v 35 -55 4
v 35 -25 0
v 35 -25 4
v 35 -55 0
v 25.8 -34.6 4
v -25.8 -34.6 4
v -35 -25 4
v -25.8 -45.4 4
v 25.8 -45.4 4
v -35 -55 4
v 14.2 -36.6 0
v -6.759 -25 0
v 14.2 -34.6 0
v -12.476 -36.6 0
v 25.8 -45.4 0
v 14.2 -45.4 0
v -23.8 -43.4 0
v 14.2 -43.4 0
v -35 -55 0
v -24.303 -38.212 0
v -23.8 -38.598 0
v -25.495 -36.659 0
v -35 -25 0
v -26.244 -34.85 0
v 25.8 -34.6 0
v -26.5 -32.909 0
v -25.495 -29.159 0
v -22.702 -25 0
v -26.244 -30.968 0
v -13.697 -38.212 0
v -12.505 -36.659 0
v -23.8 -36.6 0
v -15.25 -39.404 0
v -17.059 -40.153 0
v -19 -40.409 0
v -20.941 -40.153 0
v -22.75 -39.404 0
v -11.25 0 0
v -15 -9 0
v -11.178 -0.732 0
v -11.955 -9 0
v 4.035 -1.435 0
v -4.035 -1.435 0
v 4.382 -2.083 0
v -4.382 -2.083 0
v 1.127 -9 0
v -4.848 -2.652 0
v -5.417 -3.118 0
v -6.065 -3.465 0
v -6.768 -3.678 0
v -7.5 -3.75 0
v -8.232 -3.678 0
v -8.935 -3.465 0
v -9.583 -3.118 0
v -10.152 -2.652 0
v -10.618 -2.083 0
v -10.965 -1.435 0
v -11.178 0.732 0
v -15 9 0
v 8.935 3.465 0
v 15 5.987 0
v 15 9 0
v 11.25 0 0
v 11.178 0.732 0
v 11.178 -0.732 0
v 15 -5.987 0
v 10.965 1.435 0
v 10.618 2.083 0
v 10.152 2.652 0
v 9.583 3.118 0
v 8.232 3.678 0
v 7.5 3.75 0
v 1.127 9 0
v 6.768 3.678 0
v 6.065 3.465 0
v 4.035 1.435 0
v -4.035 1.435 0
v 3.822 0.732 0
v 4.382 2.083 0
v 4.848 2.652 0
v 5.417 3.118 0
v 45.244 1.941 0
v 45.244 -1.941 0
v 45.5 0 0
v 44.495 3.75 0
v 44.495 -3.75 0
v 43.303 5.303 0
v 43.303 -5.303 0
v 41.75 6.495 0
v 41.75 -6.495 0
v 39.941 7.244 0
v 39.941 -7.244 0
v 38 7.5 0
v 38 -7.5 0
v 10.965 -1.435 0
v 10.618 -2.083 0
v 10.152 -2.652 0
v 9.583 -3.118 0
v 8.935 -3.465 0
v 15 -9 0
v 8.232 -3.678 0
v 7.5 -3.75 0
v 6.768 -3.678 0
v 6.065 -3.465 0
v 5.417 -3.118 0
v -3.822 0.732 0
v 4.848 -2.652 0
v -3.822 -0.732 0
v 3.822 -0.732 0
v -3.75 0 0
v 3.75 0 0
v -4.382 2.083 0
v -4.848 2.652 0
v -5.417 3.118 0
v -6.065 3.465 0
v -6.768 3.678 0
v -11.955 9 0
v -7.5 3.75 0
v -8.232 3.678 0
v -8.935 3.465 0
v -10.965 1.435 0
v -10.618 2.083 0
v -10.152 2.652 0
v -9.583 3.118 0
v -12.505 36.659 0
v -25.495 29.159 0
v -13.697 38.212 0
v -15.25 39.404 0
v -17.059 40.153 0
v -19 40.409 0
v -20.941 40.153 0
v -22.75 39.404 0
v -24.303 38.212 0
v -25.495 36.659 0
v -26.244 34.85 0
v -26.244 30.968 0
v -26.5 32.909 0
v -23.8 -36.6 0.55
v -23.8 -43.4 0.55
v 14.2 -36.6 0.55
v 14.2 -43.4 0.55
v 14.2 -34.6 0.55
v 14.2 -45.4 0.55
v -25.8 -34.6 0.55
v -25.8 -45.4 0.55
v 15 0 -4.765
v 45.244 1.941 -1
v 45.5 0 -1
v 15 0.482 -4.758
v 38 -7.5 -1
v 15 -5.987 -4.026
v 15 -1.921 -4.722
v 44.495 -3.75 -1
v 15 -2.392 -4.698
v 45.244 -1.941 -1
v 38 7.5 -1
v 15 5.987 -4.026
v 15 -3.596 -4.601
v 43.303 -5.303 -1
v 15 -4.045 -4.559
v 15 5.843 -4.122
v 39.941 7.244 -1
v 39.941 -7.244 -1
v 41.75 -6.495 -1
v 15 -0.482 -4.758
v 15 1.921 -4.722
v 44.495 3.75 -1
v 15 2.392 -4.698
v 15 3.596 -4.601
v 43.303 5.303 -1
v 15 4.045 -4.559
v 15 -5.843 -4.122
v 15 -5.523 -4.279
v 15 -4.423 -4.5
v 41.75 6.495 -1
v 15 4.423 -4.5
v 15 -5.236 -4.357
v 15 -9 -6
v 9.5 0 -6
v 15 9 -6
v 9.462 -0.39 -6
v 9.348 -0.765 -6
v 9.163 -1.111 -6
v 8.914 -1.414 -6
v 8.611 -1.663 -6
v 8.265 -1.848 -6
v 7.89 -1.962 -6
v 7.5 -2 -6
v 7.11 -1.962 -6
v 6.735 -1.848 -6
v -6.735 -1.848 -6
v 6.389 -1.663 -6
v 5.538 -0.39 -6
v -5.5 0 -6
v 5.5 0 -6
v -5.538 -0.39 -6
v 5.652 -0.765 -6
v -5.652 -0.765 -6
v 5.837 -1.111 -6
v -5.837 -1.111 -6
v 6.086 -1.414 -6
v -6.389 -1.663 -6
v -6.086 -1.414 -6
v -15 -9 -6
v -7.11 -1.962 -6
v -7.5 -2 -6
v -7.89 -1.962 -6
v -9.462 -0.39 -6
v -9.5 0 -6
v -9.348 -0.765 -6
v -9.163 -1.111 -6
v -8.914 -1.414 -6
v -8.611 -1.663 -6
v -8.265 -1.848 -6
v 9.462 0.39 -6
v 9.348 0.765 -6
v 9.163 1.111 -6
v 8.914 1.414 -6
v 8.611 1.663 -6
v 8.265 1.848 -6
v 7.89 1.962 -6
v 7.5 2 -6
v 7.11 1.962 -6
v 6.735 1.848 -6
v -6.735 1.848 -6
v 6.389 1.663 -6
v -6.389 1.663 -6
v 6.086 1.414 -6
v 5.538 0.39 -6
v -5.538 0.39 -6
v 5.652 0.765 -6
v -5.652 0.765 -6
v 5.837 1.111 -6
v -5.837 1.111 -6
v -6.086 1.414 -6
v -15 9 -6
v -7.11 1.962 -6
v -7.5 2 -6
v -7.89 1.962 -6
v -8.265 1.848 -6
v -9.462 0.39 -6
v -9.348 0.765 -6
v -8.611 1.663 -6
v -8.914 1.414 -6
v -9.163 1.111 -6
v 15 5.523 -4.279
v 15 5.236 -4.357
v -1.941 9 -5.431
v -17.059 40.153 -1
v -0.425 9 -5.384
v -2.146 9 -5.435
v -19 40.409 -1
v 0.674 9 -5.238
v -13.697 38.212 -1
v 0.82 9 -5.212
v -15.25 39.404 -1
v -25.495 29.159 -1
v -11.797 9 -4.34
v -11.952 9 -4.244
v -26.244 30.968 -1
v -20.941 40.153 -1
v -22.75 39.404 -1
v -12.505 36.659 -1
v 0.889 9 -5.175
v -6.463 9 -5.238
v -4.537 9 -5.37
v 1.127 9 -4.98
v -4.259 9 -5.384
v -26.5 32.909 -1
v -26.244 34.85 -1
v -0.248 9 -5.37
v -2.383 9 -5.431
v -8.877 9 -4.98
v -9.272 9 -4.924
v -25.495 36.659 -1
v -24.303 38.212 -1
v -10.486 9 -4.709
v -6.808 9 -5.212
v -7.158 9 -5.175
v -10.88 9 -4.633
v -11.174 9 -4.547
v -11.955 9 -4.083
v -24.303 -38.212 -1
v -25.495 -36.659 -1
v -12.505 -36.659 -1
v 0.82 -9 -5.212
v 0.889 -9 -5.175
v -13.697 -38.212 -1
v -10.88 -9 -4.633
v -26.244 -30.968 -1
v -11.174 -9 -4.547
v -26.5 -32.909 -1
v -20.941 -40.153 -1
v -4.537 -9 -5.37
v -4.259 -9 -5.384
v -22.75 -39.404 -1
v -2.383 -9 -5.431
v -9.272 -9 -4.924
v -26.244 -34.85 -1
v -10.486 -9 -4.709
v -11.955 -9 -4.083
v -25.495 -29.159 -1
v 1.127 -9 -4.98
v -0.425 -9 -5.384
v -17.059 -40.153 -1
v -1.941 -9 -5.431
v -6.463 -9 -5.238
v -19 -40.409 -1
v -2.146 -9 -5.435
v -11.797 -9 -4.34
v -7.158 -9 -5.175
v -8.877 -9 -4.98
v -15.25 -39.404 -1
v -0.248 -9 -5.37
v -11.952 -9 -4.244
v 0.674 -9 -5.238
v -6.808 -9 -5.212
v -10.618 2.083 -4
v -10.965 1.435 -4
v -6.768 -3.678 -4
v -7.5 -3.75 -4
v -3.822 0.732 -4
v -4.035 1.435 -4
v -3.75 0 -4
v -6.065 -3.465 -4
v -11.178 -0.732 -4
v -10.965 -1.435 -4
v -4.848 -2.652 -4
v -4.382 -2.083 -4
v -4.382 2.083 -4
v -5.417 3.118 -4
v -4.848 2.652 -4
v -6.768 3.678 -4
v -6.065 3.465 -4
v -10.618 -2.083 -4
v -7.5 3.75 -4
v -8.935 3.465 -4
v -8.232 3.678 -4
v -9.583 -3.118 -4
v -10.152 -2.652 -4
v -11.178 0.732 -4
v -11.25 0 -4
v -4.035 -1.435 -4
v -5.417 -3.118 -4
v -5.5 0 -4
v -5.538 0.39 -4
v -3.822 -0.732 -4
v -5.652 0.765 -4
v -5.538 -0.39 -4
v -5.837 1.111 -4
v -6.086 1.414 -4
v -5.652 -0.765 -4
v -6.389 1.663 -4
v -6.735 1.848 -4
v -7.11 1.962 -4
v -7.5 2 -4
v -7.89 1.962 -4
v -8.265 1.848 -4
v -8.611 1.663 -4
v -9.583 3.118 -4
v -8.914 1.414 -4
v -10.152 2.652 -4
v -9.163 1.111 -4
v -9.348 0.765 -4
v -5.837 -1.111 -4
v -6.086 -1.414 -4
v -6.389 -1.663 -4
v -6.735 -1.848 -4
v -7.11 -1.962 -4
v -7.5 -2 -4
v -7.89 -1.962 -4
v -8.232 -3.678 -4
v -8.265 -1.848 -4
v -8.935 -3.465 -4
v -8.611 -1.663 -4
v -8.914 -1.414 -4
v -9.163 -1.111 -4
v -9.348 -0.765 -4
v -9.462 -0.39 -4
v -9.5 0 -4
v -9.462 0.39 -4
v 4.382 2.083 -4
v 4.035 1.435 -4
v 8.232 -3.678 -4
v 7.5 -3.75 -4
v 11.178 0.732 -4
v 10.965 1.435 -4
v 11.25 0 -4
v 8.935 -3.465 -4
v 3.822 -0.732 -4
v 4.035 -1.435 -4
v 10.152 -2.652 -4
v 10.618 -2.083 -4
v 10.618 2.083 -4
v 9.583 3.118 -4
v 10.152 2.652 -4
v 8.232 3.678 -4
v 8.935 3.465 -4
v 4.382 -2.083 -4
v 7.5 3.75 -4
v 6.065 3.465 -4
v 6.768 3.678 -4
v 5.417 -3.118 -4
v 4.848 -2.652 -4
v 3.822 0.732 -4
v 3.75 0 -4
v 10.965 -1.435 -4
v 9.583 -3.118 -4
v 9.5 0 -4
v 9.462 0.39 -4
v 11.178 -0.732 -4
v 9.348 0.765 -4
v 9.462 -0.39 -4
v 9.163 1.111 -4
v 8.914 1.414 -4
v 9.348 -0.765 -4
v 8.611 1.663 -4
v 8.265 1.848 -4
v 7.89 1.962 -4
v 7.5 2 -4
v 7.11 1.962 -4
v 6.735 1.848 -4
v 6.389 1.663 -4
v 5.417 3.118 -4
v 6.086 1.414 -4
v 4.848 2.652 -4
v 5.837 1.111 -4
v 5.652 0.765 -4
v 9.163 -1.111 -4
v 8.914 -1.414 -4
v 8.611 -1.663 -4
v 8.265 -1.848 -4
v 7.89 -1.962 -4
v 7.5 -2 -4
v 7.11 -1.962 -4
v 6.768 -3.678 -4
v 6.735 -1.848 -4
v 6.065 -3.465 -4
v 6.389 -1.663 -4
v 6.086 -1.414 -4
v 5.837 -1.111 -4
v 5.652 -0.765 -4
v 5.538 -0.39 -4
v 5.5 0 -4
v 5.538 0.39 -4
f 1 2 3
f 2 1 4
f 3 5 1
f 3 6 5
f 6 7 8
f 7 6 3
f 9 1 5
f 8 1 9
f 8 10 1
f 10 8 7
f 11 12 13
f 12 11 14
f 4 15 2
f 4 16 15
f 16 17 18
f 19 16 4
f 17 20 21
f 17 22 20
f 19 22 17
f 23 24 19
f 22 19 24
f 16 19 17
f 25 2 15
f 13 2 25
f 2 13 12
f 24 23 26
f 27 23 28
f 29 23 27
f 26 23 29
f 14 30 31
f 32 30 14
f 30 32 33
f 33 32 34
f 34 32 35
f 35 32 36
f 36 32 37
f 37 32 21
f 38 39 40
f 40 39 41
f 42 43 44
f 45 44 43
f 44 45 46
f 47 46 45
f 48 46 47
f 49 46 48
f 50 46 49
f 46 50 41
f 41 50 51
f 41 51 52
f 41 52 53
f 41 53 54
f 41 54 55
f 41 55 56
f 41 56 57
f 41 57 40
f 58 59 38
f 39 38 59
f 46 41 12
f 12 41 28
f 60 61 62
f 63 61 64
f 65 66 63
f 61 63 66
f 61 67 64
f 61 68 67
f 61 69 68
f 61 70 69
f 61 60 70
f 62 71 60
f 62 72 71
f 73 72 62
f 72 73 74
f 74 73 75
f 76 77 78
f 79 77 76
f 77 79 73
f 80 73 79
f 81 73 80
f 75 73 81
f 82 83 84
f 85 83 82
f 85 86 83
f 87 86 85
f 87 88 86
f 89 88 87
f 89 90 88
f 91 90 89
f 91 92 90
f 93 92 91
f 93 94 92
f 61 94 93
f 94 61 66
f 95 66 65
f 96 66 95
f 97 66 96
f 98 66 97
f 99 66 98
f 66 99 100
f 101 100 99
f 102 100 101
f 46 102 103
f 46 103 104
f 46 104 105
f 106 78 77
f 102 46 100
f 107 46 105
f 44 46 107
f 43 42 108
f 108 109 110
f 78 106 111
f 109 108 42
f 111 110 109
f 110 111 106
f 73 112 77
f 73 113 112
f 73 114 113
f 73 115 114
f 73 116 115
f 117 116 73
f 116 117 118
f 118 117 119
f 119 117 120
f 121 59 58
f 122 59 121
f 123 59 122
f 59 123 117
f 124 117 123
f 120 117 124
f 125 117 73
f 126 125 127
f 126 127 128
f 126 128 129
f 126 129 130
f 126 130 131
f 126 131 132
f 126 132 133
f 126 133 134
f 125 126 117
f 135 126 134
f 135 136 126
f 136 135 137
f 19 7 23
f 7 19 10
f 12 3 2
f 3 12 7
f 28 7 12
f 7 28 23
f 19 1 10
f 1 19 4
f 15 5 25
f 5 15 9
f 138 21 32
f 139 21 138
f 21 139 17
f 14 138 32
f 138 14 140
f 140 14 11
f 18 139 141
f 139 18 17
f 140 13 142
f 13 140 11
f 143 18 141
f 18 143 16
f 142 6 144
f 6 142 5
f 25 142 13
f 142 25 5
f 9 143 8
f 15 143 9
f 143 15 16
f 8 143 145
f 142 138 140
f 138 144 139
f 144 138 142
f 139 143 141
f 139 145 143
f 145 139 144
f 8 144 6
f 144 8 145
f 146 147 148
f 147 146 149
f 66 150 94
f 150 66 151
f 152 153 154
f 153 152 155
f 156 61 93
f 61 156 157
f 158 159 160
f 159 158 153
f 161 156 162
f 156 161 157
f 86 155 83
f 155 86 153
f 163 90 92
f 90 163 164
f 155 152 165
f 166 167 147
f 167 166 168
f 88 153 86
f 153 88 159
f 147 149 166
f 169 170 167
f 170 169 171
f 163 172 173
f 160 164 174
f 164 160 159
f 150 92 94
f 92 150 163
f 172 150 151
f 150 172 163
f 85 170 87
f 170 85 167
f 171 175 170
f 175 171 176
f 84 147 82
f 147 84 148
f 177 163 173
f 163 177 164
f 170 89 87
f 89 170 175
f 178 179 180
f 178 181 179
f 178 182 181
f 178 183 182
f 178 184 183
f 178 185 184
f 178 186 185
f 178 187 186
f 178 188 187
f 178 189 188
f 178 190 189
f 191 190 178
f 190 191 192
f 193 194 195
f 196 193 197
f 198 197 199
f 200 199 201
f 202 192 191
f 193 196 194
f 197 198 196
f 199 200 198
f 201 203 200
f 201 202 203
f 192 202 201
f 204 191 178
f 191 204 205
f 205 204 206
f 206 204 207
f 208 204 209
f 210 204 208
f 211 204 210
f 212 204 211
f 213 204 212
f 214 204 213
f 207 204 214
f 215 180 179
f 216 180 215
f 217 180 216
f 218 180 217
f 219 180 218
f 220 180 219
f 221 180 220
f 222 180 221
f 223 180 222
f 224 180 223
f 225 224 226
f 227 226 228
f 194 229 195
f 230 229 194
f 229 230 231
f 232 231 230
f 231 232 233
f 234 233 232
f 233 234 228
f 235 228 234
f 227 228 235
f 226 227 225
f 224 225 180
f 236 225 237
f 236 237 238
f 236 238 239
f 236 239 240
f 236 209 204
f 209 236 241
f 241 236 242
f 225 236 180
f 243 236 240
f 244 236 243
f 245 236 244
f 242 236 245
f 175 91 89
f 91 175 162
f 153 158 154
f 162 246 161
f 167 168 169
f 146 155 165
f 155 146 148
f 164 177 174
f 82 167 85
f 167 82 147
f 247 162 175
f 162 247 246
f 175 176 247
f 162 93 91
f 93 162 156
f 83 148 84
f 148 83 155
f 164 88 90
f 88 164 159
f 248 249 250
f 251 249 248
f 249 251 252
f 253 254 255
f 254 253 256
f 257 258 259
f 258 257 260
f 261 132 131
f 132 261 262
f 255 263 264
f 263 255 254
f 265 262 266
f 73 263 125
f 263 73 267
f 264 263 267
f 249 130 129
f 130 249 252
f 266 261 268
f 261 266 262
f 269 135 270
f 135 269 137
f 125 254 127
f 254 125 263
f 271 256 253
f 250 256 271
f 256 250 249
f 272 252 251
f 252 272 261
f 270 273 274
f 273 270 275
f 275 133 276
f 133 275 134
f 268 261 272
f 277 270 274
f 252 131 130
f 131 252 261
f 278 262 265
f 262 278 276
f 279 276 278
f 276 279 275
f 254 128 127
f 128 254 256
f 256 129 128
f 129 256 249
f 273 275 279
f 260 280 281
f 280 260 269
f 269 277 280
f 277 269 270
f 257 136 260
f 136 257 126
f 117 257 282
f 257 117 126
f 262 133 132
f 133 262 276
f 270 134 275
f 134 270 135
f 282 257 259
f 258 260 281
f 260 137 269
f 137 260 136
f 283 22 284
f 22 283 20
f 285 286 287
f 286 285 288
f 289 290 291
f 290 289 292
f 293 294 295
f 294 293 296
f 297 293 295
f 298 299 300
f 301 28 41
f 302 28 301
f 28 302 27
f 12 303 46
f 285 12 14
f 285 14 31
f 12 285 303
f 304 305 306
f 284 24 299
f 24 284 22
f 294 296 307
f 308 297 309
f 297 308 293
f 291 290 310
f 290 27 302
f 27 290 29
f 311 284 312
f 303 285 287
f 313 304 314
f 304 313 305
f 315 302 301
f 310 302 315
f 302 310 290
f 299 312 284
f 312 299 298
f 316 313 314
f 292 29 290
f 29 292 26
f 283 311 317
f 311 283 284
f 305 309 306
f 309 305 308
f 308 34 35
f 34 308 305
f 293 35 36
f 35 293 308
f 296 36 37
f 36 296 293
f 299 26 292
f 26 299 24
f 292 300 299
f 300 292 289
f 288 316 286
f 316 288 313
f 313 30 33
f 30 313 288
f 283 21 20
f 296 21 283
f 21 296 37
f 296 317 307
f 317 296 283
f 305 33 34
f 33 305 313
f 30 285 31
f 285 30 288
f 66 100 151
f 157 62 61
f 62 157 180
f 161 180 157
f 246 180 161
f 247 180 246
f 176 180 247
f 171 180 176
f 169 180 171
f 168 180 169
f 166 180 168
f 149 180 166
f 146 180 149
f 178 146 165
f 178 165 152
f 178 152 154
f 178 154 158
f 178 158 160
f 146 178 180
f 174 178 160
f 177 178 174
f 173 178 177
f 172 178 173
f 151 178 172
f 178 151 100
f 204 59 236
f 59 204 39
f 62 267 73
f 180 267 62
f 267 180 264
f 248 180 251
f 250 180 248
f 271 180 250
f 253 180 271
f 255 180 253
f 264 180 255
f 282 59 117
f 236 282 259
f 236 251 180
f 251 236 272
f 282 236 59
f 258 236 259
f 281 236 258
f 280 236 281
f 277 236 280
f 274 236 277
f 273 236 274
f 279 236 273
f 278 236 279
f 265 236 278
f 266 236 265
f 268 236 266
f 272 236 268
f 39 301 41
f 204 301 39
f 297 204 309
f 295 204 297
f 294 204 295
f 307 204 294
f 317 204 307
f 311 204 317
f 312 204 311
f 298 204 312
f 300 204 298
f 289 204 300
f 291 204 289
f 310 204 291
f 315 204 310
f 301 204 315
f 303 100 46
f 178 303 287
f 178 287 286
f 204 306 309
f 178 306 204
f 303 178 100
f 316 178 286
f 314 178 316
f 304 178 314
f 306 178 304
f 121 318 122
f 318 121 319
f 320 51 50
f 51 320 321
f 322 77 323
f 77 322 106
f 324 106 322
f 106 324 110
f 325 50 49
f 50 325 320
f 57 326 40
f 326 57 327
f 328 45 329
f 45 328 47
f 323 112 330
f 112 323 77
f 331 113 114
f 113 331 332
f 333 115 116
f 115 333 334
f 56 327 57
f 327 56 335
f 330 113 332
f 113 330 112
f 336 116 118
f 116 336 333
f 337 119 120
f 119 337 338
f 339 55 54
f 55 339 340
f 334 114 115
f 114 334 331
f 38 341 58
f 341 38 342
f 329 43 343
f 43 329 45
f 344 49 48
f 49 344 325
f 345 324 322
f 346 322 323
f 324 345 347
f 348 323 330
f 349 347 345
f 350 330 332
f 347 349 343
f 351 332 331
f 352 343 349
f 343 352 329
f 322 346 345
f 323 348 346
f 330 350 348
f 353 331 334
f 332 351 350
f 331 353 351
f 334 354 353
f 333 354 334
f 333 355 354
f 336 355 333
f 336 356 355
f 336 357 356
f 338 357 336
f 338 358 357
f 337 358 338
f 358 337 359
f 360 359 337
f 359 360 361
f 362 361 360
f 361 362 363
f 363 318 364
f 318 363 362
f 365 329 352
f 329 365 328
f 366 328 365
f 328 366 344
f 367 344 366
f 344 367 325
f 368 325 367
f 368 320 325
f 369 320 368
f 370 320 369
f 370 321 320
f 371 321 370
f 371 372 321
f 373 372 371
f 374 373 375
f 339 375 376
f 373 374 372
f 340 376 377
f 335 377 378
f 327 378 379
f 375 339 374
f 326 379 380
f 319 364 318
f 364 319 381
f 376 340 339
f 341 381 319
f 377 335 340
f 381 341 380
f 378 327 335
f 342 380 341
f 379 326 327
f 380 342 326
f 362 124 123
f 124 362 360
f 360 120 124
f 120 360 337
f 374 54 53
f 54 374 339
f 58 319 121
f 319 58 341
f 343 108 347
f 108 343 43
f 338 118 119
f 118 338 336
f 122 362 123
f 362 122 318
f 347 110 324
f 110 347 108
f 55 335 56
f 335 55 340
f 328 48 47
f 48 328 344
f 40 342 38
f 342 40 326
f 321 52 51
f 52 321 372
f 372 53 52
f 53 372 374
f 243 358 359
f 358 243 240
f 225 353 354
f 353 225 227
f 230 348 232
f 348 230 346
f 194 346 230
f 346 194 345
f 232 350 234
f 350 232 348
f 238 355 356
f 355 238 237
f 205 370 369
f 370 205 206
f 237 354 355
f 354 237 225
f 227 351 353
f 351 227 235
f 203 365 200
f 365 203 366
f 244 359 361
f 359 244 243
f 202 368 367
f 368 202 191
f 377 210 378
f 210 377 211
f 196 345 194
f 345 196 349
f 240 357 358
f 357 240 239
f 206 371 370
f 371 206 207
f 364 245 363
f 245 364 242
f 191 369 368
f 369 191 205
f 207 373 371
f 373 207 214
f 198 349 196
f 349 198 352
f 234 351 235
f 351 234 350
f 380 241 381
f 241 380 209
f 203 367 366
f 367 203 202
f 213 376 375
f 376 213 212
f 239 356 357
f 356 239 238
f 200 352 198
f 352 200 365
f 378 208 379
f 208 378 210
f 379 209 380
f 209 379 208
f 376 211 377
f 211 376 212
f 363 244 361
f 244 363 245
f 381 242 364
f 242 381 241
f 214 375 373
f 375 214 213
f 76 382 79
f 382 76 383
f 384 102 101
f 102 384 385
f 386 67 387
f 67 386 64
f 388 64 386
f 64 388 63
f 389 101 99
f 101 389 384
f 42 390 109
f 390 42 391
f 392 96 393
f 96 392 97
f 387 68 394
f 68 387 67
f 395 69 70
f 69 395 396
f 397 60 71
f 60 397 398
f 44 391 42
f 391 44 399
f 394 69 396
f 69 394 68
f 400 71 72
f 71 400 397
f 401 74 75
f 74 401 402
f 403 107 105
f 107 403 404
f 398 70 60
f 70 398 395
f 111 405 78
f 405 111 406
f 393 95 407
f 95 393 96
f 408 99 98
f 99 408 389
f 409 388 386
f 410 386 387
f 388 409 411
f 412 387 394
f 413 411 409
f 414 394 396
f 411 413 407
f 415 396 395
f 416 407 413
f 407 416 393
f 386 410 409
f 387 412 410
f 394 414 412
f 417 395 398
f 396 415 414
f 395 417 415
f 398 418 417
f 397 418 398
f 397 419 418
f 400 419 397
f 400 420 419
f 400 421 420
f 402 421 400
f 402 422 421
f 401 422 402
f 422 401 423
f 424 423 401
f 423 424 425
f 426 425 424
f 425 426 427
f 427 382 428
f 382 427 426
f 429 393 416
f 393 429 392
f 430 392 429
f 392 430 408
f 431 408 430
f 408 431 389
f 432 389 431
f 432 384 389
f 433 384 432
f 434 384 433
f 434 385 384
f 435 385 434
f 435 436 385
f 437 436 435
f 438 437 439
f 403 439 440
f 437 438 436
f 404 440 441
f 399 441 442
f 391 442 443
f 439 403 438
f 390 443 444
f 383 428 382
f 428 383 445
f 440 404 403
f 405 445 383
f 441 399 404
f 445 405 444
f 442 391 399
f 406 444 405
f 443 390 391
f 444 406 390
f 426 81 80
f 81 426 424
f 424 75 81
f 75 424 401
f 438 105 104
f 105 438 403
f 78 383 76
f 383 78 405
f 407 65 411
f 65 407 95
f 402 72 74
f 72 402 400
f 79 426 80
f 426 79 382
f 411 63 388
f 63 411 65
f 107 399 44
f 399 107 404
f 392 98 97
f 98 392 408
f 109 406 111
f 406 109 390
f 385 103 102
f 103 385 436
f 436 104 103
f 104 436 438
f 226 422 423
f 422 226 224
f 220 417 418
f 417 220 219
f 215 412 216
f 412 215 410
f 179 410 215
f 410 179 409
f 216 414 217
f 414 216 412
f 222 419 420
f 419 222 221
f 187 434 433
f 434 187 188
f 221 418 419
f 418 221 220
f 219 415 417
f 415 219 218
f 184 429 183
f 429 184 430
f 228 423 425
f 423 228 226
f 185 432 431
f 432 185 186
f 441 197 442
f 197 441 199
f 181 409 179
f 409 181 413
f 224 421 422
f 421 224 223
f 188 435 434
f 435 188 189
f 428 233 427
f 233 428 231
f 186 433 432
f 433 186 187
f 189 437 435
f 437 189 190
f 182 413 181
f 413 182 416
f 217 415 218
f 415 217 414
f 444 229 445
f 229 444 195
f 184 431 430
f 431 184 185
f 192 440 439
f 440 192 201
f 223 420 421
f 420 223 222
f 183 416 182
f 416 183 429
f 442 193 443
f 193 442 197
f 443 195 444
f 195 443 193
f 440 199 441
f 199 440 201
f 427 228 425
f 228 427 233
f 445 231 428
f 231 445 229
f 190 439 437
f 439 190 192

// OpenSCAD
//
// barre de LED
//
LEDlargeur=51;
LEDprofondeur=10.2;
LEDhauteur=3.2;


module led(extra=[0,0,0],shift=[0,0,0]) {
    translate([-LEDlargeur/2,-LEDprofondeur/2,0])
    translate(-extra/2+shift)
    cube([LEDlargeur,LEDprofondeur,LEDhauteur]+extra);
}


module LEDpiece(tol=[0.6,0.6,0.5]) {
    color("green") led(shift=[0,0,4-LEDhauteur-tol[2]/2]);
}

module LEDsupport(tol=[0.6,0.6,0.5]) {
    difference() {
        translate([0,0,2]) cube([70,30,4],center=true);
        led(extra=[-2,-4,10]+tol,shift=[1,0,0]);
*        led(extra=[-40,0,10]+tol,shift=[-40/2,0,0]); // special!!
        led(extra=[-40,0,10]+tol,shift=[40/2,0,0]);
        led(extra=[0,0,1]+tol,shift=[0,0,4-LEDhauteur+1/2]);
    }
}

translate([0,-40,0]) {
    LEDsupport();
    *LEDpiece();
}


//
// NFC
//
NFClargeur=59.7;
NFCprofondeur=39.4;
NFChauteur=1.2;

module nfc(extra=[0,0,0],shift=[0,0,0]) {
    translate([-NFClargeur/2+NFCprofondeur/2,0,0])
    translate([-NFClargeur/2,-NFCprofondeur/2,0])
    translate(-extra/2+shift)
    cube([NFClargeur,NFCprofondeur,NFChauteur]+extra);
}


module NFCpiece(tol=[0.6,0.6,2]) {
    color("green") nfc(shift=[0,0,4-NFChauteur-tol[2]/2]);
}


module NFCsupport(tol=[0.6,0.6,2]) {
    difference() {
        translate([-NFClargeur/2+NFCprofondeur/2,0,0])
        translate([0,0,2]) cube([80,60,4],center=true);
        nfc(extra=[-2,-4,10]+tol,shift=[-1,0,0]);
        nfc(extra=[-40,0,10]+tol,shift=[-40/2,0,0]);
        nfc(extra=[0,0,1]+tol,shift=[0,0,4-NFChauteur+1/2]);
    }
}

* union() {
*%NFCpiece();
NFCsupport();
}


//
// poidsA
// attache du dessus
//

POIDSespace=6; // minimum 6 pour la tete de vis
epaisseur=2;
barreW=25;extraW=5;
barreH=13;extraH=5;

module triple() {
    for(i=[0:120:359]) {
        hull() {
            rotate([0,0,i]) children(0);
            children(1);
        }
    }
}

module separe(d=[15,0,0]) {
    translate(-d/2) children();
    translate(d/2) children();
}

module poidsA(helice=true,extraTrou=0) {
    difference() {
        union() {
            if( helice ) {
                triple() {
                    translate([38,0,-1]) cylinder(d=15,h=1);
                    translate([0,0,-POIDSespace]) cylinder(d=10,h=POIDSespace);
                }
            }
            translate([0,0,-POIDSespace/2]) cube([barreW+extraW,barreH+extraH,POIDSespace],center=true);
        }
        // les deux trous
        separe() {
            translate([0,0,50-POIDSespace+epaisseur]) cylinder(d=7.5+extraTrou*2,h=100,center=true,$fn=32);
            cylinder(d=4+extraTrou,h=100,center=true,$fn=32);
        }
    }
}

module poidsB() {
    translate([80-barreW,0,-POIDSespace*2-12.75]) rotate([180,0,0]) poidsA(helice=false,extraTrou=1);
}

module poidsBarre() {
    color("red")
    translate([40-barreW/2,0,-12.75/2-POIDSespace])
    cube([80,12.75,12.75],center=true);
}

*poidsBarre();
*%cylinder(d=120,h=4);
poidsA();
*poidsB();


module deplace() {
    translate([0,0,-POIDSespace*2-12.75]) children();
}
